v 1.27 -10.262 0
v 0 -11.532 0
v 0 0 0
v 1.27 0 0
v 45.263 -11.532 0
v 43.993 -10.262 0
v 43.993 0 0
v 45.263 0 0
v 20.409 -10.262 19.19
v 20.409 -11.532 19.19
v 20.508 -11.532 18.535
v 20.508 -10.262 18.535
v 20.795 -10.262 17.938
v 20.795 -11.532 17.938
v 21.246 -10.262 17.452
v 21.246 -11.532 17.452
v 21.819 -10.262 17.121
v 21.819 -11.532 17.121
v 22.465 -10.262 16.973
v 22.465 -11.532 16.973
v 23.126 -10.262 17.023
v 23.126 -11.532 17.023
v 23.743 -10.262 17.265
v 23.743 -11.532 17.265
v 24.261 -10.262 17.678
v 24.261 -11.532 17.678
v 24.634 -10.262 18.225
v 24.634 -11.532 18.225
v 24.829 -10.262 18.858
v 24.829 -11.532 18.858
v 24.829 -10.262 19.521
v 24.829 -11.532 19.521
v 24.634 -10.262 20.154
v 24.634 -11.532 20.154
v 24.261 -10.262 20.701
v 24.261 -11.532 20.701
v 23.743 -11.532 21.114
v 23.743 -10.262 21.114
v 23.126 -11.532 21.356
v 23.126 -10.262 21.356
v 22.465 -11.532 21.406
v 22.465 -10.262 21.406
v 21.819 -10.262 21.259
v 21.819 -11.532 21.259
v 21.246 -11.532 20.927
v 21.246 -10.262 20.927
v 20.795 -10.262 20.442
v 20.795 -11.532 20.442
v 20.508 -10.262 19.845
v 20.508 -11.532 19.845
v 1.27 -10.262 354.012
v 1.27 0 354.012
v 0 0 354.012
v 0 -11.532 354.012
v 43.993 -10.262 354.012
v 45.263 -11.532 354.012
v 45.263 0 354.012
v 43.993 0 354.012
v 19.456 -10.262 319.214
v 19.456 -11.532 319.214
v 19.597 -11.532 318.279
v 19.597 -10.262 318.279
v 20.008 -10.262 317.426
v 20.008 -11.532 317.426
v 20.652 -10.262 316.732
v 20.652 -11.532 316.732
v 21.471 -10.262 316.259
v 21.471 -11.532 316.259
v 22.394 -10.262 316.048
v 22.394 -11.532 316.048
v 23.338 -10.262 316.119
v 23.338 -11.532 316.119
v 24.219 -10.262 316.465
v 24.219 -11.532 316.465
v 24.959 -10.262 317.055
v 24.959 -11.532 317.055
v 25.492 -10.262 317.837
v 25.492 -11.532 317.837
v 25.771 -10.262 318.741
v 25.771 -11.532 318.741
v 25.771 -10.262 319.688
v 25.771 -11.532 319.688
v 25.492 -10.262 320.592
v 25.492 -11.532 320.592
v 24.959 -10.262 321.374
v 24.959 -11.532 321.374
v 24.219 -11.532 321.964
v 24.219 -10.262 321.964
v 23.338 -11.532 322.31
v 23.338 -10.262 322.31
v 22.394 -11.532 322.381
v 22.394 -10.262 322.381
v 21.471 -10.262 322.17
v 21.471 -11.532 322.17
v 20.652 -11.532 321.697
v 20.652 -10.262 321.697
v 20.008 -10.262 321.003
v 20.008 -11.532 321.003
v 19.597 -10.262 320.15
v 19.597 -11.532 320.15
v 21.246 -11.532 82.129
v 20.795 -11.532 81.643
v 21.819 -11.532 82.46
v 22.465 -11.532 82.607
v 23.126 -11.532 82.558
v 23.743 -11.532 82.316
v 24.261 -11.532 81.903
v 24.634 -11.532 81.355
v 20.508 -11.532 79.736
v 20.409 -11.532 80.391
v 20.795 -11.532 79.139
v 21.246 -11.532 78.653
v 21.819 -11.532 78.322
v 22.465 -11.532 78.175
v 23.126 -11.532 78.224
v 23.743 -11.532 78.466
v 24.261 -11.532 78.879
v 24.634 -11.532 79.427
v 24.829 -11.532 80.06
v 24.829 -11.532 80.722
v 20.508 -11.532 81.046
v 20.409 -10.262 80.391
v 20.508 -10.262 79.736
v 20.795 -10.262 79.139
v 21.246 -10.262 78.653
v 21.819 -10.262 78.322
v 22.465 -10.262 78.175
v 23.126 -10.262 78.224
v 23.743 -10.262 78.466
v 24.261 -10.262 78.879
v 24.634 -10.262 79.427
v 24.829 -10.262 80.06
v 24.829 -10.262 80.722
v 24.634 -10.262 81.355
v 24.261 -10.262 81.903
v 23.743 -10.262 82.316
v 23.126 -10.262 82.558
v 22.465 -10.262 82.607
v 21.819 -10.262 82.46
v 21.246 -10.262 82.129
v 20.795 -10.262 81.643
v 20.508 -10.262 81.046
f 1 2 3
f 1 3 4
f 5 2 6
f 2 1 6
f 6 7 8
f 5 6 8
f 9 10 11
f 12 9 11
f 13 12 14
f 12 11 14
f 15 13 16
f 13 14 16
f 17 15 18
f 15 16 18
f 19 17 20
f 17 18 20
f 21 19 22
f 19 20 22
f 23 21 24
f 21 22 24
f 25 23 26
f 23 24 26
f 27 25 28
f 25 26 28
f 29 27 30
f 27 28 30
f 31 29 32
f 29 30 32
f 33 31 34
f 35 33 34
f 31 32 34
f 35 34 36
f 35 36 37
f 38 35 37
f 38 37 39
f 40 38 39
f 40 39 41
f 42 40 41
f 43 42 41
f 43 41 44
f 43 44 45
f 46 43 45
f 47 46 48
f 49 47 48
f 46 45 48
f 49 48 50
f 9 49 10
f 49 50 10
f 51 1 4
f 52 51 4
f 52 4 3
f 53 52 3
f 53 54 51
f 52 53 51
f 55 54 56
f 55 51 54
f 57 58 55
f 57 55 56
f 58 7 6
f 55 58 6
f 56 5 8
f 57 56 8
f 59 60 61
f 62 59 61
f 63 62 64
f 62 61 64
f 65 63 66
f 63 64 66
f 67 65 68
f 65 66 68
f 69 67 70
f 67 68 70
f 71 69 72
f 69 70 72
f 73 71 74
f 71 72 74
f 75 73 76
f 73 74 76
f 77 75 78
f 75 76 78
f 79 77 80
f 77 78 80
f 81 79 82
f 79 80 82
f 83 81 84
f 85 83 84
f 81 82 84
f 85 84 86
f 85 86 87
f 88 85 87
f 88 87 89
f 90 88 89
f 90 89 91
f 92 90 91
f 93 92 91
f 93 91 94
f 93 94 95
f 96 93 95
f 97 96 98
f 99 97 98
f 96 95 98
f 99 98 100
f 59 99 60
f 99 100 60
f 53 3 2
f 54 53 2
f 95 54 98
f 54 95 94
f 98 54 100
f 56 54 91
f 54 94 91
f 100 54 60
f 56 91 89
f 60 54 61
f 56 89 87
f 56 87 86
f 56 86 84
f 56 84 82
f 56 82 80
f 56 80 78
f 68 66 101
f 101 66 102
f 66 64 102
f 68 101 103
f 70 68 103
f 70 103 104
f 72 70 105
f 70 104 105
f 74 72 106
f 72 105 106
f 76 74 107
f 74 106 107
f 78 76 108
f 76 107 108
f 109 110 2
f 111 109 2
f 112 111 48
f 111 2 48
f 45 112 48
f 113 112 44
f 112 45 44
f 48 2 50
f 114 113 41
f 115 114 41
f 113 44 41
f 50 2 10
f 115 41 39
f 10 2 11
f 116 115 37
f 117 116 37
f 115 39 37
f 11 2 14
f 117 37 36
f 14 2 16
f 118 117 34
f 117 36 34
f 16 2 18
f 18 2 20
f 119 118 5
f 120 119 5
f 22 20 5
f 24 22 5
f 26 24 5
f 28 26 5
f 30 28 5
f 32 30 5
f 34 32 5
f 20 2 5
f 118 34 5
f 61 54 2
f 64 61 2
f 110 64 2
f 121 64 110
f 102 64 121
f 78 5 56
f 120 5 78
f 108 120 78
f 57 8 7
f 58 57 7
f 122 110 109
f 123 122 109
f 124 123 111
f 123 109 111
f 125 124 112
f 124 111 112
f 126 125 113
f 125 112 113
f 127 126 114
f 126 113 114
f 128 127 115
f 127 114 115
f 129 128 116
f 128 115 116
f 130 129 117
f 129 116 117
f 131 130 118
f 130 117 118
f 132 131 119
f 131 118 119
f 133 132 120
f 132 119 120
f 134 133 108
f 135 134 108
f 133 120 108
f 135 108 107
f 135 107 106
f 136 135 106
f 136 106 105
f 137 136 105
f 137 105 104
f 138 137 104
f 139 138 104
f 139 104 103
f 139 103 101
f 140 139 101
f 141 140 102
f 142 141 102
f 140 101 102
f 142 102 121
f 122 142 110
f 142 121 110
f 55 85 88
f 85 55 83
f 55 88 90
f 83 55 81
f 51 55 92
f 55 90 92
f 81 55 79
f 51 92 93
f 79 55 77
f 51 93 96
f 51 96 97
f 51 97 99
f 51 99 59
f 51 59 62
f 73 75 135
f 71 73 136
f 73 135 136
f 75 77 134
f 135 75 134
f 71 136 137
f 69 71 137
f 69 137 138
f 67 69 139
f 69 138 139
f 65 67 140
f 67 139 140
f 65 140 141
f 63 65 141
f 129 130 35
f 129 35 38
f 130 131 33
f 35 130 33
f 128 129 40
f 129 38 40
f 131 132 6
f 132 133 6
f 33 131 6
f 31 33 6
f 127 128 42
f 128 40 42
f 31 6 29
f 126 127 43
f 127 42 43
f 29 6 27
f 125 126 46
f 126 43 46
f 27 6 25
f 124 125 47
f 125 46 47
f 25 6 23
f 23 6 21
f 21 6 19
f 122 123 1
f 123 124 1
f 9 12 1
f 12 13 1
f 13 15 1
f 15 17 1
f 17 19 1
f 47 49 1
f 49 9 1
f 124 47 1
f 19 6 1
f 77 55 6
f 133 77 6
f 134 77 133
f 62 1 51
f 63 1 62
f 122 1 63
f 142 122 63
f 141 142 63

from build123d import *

# Parameters (mm, degrees)
BOSS_EXTRUDE1_DEPTH = 354.0125
SKETCH2_R           = 2.2225
SKETCH2_R_2         = 3.175
CUT_EXTRUDE1_DEPTH  = 1.27


with BuildPart() as part:
    # Sketch1 → Boss-Extrude1 (new body)
    with BuildSketch(Plane.XY):
        Polygon((0, 0), (0, -11.5316), (45.2628, -11.5316), (45.2628, 0), (43.9928, 0), (43.9928, -10.2616), (1.27, -10.2616), (1.27, 0), align=None)
    extrude(amount=BOSS_EXTRUDE1_DEPTH)

    # Sketch2 → Cut-Extrude1 (cut)
    with BuildSketch(Plane(origin=(0, -11.5316, 0), x_dir=(-1, 0, 0), z_dir=(0, -1, 0))):
        with Locations((-22.6314, -19.1897)):
            Circle(SKETCH2_R)
        with Locations((-22.6314, -80.391)):
            Circle(SKETCH2_R)
        with Locations((-22.6314, -319.2145)):
            Circle(SKETCH2_R_2)
    extrude(amount=-CUT_EXTRUDE1_DEPTH, mode=Mode.SUBTRACT)


solid = part.part
